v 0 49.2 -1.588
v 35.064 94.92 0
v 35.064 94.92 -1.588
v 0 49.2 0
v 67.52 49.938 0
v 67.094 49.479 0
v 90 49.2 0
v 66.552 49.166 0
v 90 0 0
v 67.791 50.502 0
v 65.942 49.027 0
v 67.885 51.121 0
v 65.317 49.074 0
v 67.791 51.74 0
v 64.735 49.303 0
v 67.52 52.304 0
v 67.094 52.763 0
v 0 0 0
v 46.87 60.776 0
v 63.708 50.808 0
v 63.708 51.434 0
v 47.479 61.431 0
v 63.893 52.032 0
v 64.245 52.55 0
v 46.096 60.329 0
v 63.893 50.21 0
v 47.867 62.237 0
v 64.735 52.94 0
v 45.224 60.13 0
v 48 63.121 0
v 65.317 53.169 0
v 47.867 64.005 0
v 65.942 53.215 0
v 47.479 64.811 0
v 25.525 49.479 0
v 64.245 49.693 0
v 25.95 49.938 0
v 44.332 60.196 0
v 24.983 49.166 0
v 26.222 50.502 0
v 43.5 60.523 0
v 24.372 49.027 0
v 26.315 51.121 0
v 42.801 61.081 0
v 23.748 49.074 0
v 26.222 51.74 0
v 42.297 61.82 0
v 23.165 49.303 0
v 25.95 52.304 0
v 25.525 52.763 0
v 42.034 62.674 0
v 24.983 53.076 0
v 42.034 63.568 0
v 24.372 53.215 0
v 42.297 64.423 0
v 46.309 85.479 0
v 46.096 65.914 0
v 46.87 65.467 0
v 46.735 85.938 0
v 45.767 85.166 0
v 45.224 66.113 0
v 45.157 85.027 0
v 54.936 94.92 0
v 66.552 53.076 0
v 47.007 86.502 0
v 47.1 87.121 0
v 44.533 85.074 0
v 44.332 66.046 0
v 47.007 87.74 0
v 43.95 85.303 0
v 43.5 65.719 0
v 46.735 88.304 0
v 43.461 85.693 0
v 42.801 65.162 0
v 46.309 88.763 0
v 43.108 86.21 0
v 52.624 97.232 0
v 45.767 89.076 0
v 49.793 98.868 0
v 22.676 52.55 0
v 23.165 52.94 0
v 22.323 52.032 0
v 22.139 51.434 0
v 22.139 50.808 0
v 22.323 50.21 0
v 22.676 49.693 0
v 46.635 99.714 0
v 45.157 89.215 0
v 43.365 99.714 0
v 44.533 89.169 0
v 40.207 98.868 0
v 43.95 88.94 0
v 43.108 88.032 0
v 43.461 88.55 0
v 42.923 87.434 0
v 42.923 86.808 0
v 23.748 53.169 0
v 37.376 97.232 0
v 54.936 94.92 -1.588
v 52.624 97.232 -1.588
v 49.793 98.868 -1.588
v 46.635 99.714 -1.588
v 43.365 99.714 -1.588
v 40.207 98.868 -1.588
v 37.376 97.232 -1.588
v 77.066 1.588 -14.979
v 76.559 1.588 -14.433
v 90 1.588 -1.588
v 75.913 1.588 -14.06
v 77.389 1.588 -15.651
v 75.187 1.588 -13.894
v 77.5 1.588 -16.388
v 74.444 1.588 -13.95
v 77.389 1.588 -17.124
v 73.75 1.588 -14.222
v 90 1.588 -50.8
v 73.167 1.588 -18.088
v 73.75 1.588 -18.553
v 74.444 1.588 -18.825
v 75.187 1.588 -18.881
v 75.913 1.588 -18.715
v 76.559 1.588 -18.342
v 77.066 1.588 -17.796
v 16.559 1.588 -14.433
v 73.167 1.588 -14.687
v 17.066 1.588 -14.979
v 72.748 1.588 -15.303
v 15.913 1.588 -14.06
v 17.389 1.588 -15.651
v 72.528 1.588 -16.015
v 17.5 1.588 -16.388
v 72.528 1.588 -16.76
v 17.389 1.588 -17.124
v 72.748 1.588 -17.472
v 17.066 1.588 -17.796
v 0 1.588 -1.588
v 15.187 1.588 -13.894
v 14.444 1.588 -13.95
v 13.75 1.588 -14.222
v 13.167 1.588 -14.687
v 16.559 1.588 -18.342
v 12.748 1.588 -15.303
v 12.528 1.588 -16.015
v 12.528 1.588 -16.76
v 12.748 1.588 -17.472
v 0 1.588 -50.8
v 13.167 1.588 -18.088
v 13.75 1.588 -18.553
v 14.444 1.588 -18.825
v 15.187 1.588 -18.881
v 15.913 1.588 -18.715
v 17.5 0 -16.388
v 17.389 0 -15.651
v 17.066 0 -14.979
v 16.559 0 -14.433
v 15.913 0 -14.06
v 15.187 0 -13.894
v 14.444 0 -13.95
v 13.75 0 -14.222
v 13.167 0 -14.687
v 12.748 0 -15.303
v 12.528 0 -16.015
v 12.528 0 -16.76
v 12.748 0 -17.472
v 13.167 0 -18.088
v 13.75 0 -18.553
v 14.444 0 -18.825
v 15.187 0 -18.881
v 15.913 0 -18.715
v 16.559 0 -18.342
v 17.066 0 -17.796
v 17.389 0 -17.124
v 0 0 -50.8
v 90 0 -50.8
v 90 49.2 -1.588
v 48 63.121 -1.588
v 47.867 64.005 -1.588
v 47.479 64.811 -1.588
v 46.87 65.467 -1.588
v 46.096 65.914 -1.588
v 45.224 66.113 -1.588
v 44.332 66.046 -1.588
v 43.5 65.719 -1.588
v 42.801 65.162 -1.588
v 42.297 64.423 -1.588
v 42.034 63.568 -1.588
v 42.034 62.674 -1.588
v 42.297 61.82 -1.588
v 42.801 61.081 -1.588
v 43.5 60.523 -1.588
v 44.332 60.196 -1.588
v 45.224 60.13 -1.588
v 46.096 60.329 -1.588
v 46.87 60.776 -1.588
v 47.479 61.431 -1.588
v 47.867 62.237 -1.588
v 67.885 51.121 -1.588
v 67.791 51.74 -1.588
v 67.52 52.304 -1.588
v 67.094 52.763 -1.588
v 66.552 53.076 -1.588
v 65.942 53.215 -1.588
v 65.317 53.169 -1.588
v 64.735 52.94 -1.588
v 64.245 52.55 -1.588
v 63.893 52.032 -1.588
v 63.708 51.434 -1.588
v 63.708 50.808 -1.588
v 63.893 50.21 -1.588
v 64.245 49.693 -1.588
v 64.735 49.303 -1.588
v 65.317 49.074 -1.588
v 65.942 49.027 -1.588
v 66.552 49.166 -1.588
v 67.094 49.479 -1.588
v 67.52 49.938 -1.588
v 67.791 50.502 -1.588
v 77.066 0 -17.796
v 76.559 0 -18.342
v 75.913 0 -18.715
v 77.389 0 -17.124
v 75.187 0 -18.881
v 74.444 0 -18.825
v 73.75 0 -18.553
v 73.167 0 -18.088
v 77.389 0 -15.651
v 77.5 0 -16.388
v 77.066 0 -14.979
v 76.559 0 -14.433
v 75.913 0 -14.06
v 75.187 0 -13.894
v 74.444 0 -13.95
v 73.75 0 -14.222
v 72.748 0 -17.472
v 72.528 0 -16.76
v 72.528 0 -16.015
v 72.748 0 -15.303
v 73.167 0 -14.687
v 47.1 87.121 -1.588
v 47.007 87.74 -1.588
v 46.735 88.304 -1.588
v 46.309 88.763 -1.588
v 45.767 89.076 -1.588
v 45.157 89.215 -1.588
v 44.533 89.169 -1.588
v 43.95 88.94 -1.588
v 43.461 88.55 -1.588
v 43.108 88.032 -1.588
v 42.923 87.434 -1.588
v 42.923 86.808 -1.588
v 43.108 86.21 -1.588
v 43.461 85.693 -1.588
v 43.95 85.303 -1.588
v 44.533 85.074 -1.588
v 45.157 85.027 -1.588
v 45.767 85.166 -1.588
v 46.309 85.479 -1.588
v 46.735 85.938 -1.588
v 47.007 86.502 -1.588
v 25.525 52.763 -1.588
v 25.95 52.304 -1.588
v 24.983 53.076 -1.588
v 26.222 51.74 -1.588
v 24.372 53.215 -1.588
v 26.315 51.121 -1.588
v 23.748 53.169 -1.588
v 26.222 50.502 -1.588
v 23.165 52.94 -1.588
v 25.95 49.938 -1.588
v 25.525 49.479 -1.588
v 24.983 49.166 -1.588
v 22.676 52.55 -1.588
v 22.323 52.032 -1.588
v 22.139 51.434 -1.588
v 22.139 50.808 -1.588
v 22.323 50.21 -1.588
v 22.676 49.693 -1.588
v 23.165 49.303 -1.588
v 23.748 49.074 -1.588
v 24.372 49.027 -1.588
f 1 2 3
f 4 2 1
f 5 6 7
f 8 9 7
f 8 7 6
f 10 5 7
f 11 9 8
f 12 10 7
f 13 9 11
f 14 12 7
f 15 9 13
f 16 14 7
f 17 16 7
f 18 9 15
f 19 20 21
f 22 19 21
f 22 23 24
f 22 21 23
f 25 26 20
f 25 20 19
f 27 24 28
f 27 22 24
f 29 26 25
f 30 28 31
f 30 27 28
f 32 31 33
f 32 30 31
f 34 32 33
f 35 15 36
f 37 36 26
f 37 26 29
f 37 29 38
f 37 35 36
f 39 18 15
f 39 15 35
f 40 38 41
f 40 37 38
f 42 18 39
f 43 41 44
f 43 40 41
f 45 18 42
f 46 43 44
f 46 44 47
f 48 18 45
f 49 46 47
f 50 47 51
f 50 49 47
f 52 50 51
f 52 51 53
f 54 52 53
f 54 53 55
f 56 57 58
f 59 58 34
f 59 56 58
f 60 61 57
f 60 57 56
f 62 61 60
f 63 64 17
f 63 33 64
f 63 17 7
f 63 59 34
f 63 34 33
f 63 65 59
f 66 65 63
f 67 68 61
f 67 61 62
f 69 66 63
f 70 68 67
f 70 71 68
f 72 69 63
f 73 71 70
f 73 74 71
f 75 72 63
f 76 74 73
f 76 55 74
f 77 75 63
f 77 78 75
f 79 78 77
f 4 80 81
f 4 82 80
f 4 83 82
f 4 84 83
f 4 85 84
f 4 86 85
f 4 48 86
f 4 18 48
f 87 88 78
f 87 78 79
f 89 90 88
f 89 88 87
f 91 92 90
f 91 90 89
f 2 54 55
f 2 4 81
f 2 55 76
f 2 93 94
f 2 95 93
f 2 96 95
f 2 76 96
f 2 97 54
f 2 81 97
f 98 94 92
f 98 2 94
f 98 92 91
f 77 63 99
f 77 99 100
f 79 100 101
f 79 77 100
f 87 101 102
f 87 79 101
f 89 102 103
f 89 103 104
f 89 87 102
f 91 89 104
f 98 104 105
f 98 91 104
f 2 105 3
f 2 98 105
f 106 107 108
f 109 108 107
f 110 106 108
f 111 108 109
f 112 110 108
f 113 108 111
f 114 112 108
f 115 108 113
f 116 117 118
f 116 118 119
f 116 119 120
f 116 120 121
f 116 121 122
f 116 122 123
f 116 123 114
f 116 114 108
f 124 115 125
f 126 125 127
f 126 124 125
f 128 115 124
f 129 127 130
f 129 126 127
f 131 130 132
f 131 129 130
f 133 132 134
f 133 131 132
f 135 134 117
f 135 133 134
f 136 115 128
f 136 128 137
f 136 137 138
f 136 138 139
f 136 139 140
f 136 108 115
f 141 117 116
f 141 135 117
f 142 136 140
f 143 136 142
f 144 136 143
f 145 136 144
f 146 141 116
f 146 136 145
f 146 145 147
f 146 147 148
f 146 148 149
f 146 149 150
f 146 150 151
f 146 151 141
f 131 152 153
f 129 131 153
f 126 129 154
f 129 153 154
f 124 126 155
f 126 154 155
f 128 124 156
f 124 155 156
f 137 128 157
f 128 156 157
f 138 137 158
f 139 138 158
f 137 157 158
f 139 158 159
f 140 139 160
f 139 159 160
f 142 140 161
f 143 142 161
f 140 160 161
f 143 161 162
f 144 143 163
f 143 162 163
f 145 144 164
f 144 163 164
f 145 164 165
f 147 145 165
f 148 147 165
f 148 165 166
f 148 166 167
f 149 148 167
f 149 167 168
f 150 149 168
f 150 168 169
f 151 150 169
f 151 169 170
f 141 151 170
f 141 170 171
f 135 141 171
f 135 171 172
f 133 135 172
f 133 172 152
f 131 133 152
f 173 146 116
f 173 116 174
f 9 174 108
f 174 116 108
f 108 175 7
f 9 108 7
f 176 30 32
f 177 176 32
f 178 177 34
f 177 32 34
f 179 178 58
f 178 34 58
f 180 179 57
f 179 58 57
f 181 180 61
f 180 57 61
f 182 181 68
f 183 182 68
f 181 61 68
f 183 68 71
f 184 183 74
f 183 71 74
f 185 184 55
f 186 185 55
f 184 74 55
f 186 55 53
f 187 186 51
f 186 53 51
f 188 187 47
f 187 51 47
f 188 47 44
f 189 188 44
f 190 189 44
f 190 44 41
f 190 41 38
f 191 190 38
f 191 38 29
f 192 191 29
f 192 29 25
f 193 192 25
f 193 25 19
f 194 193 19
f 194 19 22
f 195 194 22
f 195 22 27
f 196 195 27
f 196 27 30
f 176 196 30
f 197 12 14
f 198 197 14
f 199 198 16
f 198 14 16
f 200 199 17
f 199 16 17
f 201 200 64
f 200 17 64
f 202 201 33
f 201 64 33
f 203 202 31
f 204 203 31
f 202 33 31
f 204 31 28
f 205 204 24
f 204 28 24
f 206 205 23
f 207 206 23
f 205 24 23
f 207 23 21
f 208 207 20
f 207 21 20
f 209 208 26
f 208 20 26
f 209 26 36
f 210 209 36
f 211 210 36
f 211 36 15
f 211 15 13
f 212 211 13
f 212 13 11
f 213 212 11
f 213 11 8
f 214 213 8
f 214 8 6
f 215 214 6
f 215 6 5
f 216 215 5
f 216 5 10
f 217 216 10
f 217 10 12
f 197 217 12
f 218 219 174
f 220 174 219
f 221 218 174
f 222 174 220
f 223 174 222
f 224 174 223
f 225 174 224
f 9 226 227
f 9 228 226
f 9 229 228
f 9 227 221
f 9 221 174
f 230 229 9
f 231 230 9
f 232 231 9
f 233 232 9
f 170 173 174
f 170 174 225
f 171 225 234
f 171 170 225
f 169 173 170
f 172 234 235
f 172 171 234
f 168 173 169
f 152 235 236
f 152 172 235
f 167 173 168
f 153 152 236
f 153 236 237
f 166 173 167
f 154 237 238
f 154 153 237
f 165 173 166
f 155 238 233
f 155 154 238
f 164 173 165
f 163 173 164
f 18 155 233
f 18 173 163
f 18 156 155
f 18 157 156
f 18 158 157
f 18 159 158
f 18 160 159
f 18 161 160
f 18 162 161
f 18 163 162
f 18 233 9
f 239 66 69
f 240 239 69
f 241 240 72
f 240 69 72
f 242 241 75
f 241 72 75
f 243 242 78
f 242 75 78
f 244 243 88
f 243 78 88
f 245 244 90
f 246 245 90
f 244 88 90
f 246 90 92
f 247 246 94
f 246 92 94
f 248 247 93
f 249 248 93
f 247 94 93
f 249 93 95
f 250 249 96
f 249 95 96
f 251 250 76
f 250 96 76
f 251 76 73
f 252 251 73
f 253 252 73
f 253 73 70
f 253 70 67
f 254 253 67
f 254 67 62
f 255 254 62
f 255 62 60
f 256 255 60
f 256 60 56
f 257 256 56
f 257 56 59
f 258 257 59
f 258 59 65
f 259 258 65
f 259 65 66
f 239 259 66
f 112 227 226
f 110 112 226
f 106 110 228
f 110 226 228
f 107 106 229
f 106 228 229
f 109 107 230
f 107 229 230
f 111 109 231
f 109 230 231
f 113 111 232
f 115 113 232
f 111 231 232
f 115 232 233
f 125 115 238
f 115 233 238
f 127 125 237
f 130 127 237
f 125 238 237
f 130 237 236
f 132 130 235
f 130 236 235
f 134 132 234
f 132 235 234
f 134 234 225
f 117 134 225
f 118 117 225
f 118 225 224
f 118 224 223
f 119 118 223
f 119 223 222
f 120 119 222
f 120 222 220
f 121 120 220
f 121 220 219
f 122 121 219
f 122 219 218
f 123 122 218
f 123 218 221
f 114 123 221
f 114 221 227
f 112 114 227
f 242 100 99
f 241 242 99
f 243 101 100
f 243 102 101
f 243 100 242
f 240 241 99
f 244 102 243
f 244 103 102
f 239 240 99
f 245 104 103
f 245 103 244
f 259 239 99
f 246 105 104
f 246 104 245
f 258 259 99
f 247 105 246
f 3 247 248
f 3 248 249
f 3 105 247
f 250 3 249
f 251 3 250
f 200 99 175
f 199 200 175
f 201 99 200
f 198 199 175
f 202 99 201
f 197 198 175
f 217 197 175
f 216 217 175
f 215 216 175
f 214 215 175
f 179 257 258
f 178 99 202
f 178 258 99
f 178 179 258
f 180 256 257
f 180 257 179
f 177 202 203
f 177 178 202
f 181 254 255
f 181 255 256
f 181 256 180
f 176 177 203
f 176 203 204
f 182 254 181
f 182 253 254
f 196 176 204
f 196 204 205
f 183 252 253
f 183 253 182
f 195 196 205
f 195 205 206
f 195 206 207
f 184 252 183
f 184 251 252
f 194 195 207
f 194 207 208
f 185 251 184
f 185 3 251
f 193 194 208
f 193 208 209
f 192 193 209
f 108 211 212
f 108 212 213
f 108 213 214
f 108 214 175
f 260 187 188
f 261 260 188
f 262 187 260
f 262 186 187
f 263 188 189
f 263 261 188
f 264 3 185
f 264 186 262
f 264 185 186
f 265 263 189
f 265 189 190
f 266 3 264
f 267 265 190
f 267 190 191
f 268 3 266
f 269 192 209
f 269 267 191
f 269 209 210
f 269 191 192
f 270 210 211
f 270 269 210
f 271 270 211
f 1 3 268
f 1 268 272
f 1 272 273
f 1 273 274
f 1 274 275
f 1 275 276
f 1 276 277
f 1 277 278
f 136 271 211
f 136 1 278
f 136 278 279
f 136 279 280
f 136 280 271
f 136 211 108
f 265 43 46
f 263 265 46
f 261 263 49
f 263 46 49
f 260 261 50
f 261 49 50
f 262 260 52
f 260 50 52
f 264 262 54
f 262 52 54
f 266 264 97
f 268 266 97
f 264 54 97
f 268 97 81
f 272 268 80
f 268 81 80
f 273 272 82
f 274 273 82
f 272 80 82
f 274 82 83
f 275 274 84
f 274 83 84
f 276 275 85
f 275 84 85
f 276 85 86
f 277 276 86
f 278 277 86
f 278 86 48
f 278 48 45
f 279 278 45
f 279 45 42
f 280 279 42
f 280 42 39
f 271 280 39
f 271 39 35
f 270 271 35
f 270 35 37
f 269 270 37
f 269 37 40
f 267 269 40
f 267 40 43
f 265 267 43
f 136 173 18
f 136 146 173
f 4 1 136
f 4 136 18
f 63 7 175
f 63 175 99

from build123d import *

# Parameters (mm, degrees)
BOSS_EXTRUDE1_DEPTH = 90
CUT_EXTRUDE1_DEPTH  = 51.8
SKETCH3_R           = 2.1
SKETCH3_R_2         = 3
CUT_EXTRUDE2_DEPTH  = 51.8
SKETCH4_R           = 2.5
CUT_EXTRUDE3_DEPTH  = 100.821221194


with BuildPart() as part:
    # Sketch1 → Boss-Extrude1 (new body)
    with BuildSketch(Plane(origin=(0, 0, 0), x_dir=(0, 0, -1), z_dir=(1, 0, 0))):
        Polygon((0, 0), (0, 100), (1.5875, 100), (1.5875, 1.5875), (50.8, 1.5875), (50.8, 0), align=None)
    extrude(amount=BOSS_EXTRUDE1_DEPTH)

    # Sketch2 → Cut-Extrude1 (cut, through all)
    with BuildSketch(Plane.XY):
        with BuildLine():
            Line((35.064378218, 94.92), (0, 49.2))
            Line((0, 49.2), (0, 100))
            Line((0, 100), (90, 100))
            Line((90, 100), (90, 49.2))
            Line((90, 49.2), (54.935621782, 94.92))
            ThreePointArc((54.935621782, 94.92), (45, 99.821221194), (35.064378218, 94.92))
        make_face()
    extrude(amount=-CUT_EXTRUDE1_DEPTH, mode=Mode.SUBTRACT)

    # Sketch3 → Cut-Extrude2 (cut, through all)
    with BuildSketch(Plane.XY):
        with Locations((45, 87.121221194)):
            Circle(SKETCH3_R)
        with Locations((65.784609691, 51.121221194)):
            Circle(SKETCH3_R)
        with Locations((24.215390309, 51.121221194)):
            Circle(SKETCH3_R)
        with Locations((45, 63.121221194)):
            Circle(SKETCH3_R_2)
    extrude(amount=-CUT_EXTRUDE2_DEPTH, mode=Mode.SUBTRACT)

    # Sketch4 → Cut-Extrude3 (cut, through all)
    with BuildSketch(Plane.XZ):
        with Locations((15, -16.3875)):
            Circle(SKETCH4_R)
        with Locations((75, -16.3875)):
            Circle(SKETCH4_R)
    extrude(amount=-CUT_EXTRUDE3_DEPTH, mode=Mode.SUBTRACT)


solid = part.part
